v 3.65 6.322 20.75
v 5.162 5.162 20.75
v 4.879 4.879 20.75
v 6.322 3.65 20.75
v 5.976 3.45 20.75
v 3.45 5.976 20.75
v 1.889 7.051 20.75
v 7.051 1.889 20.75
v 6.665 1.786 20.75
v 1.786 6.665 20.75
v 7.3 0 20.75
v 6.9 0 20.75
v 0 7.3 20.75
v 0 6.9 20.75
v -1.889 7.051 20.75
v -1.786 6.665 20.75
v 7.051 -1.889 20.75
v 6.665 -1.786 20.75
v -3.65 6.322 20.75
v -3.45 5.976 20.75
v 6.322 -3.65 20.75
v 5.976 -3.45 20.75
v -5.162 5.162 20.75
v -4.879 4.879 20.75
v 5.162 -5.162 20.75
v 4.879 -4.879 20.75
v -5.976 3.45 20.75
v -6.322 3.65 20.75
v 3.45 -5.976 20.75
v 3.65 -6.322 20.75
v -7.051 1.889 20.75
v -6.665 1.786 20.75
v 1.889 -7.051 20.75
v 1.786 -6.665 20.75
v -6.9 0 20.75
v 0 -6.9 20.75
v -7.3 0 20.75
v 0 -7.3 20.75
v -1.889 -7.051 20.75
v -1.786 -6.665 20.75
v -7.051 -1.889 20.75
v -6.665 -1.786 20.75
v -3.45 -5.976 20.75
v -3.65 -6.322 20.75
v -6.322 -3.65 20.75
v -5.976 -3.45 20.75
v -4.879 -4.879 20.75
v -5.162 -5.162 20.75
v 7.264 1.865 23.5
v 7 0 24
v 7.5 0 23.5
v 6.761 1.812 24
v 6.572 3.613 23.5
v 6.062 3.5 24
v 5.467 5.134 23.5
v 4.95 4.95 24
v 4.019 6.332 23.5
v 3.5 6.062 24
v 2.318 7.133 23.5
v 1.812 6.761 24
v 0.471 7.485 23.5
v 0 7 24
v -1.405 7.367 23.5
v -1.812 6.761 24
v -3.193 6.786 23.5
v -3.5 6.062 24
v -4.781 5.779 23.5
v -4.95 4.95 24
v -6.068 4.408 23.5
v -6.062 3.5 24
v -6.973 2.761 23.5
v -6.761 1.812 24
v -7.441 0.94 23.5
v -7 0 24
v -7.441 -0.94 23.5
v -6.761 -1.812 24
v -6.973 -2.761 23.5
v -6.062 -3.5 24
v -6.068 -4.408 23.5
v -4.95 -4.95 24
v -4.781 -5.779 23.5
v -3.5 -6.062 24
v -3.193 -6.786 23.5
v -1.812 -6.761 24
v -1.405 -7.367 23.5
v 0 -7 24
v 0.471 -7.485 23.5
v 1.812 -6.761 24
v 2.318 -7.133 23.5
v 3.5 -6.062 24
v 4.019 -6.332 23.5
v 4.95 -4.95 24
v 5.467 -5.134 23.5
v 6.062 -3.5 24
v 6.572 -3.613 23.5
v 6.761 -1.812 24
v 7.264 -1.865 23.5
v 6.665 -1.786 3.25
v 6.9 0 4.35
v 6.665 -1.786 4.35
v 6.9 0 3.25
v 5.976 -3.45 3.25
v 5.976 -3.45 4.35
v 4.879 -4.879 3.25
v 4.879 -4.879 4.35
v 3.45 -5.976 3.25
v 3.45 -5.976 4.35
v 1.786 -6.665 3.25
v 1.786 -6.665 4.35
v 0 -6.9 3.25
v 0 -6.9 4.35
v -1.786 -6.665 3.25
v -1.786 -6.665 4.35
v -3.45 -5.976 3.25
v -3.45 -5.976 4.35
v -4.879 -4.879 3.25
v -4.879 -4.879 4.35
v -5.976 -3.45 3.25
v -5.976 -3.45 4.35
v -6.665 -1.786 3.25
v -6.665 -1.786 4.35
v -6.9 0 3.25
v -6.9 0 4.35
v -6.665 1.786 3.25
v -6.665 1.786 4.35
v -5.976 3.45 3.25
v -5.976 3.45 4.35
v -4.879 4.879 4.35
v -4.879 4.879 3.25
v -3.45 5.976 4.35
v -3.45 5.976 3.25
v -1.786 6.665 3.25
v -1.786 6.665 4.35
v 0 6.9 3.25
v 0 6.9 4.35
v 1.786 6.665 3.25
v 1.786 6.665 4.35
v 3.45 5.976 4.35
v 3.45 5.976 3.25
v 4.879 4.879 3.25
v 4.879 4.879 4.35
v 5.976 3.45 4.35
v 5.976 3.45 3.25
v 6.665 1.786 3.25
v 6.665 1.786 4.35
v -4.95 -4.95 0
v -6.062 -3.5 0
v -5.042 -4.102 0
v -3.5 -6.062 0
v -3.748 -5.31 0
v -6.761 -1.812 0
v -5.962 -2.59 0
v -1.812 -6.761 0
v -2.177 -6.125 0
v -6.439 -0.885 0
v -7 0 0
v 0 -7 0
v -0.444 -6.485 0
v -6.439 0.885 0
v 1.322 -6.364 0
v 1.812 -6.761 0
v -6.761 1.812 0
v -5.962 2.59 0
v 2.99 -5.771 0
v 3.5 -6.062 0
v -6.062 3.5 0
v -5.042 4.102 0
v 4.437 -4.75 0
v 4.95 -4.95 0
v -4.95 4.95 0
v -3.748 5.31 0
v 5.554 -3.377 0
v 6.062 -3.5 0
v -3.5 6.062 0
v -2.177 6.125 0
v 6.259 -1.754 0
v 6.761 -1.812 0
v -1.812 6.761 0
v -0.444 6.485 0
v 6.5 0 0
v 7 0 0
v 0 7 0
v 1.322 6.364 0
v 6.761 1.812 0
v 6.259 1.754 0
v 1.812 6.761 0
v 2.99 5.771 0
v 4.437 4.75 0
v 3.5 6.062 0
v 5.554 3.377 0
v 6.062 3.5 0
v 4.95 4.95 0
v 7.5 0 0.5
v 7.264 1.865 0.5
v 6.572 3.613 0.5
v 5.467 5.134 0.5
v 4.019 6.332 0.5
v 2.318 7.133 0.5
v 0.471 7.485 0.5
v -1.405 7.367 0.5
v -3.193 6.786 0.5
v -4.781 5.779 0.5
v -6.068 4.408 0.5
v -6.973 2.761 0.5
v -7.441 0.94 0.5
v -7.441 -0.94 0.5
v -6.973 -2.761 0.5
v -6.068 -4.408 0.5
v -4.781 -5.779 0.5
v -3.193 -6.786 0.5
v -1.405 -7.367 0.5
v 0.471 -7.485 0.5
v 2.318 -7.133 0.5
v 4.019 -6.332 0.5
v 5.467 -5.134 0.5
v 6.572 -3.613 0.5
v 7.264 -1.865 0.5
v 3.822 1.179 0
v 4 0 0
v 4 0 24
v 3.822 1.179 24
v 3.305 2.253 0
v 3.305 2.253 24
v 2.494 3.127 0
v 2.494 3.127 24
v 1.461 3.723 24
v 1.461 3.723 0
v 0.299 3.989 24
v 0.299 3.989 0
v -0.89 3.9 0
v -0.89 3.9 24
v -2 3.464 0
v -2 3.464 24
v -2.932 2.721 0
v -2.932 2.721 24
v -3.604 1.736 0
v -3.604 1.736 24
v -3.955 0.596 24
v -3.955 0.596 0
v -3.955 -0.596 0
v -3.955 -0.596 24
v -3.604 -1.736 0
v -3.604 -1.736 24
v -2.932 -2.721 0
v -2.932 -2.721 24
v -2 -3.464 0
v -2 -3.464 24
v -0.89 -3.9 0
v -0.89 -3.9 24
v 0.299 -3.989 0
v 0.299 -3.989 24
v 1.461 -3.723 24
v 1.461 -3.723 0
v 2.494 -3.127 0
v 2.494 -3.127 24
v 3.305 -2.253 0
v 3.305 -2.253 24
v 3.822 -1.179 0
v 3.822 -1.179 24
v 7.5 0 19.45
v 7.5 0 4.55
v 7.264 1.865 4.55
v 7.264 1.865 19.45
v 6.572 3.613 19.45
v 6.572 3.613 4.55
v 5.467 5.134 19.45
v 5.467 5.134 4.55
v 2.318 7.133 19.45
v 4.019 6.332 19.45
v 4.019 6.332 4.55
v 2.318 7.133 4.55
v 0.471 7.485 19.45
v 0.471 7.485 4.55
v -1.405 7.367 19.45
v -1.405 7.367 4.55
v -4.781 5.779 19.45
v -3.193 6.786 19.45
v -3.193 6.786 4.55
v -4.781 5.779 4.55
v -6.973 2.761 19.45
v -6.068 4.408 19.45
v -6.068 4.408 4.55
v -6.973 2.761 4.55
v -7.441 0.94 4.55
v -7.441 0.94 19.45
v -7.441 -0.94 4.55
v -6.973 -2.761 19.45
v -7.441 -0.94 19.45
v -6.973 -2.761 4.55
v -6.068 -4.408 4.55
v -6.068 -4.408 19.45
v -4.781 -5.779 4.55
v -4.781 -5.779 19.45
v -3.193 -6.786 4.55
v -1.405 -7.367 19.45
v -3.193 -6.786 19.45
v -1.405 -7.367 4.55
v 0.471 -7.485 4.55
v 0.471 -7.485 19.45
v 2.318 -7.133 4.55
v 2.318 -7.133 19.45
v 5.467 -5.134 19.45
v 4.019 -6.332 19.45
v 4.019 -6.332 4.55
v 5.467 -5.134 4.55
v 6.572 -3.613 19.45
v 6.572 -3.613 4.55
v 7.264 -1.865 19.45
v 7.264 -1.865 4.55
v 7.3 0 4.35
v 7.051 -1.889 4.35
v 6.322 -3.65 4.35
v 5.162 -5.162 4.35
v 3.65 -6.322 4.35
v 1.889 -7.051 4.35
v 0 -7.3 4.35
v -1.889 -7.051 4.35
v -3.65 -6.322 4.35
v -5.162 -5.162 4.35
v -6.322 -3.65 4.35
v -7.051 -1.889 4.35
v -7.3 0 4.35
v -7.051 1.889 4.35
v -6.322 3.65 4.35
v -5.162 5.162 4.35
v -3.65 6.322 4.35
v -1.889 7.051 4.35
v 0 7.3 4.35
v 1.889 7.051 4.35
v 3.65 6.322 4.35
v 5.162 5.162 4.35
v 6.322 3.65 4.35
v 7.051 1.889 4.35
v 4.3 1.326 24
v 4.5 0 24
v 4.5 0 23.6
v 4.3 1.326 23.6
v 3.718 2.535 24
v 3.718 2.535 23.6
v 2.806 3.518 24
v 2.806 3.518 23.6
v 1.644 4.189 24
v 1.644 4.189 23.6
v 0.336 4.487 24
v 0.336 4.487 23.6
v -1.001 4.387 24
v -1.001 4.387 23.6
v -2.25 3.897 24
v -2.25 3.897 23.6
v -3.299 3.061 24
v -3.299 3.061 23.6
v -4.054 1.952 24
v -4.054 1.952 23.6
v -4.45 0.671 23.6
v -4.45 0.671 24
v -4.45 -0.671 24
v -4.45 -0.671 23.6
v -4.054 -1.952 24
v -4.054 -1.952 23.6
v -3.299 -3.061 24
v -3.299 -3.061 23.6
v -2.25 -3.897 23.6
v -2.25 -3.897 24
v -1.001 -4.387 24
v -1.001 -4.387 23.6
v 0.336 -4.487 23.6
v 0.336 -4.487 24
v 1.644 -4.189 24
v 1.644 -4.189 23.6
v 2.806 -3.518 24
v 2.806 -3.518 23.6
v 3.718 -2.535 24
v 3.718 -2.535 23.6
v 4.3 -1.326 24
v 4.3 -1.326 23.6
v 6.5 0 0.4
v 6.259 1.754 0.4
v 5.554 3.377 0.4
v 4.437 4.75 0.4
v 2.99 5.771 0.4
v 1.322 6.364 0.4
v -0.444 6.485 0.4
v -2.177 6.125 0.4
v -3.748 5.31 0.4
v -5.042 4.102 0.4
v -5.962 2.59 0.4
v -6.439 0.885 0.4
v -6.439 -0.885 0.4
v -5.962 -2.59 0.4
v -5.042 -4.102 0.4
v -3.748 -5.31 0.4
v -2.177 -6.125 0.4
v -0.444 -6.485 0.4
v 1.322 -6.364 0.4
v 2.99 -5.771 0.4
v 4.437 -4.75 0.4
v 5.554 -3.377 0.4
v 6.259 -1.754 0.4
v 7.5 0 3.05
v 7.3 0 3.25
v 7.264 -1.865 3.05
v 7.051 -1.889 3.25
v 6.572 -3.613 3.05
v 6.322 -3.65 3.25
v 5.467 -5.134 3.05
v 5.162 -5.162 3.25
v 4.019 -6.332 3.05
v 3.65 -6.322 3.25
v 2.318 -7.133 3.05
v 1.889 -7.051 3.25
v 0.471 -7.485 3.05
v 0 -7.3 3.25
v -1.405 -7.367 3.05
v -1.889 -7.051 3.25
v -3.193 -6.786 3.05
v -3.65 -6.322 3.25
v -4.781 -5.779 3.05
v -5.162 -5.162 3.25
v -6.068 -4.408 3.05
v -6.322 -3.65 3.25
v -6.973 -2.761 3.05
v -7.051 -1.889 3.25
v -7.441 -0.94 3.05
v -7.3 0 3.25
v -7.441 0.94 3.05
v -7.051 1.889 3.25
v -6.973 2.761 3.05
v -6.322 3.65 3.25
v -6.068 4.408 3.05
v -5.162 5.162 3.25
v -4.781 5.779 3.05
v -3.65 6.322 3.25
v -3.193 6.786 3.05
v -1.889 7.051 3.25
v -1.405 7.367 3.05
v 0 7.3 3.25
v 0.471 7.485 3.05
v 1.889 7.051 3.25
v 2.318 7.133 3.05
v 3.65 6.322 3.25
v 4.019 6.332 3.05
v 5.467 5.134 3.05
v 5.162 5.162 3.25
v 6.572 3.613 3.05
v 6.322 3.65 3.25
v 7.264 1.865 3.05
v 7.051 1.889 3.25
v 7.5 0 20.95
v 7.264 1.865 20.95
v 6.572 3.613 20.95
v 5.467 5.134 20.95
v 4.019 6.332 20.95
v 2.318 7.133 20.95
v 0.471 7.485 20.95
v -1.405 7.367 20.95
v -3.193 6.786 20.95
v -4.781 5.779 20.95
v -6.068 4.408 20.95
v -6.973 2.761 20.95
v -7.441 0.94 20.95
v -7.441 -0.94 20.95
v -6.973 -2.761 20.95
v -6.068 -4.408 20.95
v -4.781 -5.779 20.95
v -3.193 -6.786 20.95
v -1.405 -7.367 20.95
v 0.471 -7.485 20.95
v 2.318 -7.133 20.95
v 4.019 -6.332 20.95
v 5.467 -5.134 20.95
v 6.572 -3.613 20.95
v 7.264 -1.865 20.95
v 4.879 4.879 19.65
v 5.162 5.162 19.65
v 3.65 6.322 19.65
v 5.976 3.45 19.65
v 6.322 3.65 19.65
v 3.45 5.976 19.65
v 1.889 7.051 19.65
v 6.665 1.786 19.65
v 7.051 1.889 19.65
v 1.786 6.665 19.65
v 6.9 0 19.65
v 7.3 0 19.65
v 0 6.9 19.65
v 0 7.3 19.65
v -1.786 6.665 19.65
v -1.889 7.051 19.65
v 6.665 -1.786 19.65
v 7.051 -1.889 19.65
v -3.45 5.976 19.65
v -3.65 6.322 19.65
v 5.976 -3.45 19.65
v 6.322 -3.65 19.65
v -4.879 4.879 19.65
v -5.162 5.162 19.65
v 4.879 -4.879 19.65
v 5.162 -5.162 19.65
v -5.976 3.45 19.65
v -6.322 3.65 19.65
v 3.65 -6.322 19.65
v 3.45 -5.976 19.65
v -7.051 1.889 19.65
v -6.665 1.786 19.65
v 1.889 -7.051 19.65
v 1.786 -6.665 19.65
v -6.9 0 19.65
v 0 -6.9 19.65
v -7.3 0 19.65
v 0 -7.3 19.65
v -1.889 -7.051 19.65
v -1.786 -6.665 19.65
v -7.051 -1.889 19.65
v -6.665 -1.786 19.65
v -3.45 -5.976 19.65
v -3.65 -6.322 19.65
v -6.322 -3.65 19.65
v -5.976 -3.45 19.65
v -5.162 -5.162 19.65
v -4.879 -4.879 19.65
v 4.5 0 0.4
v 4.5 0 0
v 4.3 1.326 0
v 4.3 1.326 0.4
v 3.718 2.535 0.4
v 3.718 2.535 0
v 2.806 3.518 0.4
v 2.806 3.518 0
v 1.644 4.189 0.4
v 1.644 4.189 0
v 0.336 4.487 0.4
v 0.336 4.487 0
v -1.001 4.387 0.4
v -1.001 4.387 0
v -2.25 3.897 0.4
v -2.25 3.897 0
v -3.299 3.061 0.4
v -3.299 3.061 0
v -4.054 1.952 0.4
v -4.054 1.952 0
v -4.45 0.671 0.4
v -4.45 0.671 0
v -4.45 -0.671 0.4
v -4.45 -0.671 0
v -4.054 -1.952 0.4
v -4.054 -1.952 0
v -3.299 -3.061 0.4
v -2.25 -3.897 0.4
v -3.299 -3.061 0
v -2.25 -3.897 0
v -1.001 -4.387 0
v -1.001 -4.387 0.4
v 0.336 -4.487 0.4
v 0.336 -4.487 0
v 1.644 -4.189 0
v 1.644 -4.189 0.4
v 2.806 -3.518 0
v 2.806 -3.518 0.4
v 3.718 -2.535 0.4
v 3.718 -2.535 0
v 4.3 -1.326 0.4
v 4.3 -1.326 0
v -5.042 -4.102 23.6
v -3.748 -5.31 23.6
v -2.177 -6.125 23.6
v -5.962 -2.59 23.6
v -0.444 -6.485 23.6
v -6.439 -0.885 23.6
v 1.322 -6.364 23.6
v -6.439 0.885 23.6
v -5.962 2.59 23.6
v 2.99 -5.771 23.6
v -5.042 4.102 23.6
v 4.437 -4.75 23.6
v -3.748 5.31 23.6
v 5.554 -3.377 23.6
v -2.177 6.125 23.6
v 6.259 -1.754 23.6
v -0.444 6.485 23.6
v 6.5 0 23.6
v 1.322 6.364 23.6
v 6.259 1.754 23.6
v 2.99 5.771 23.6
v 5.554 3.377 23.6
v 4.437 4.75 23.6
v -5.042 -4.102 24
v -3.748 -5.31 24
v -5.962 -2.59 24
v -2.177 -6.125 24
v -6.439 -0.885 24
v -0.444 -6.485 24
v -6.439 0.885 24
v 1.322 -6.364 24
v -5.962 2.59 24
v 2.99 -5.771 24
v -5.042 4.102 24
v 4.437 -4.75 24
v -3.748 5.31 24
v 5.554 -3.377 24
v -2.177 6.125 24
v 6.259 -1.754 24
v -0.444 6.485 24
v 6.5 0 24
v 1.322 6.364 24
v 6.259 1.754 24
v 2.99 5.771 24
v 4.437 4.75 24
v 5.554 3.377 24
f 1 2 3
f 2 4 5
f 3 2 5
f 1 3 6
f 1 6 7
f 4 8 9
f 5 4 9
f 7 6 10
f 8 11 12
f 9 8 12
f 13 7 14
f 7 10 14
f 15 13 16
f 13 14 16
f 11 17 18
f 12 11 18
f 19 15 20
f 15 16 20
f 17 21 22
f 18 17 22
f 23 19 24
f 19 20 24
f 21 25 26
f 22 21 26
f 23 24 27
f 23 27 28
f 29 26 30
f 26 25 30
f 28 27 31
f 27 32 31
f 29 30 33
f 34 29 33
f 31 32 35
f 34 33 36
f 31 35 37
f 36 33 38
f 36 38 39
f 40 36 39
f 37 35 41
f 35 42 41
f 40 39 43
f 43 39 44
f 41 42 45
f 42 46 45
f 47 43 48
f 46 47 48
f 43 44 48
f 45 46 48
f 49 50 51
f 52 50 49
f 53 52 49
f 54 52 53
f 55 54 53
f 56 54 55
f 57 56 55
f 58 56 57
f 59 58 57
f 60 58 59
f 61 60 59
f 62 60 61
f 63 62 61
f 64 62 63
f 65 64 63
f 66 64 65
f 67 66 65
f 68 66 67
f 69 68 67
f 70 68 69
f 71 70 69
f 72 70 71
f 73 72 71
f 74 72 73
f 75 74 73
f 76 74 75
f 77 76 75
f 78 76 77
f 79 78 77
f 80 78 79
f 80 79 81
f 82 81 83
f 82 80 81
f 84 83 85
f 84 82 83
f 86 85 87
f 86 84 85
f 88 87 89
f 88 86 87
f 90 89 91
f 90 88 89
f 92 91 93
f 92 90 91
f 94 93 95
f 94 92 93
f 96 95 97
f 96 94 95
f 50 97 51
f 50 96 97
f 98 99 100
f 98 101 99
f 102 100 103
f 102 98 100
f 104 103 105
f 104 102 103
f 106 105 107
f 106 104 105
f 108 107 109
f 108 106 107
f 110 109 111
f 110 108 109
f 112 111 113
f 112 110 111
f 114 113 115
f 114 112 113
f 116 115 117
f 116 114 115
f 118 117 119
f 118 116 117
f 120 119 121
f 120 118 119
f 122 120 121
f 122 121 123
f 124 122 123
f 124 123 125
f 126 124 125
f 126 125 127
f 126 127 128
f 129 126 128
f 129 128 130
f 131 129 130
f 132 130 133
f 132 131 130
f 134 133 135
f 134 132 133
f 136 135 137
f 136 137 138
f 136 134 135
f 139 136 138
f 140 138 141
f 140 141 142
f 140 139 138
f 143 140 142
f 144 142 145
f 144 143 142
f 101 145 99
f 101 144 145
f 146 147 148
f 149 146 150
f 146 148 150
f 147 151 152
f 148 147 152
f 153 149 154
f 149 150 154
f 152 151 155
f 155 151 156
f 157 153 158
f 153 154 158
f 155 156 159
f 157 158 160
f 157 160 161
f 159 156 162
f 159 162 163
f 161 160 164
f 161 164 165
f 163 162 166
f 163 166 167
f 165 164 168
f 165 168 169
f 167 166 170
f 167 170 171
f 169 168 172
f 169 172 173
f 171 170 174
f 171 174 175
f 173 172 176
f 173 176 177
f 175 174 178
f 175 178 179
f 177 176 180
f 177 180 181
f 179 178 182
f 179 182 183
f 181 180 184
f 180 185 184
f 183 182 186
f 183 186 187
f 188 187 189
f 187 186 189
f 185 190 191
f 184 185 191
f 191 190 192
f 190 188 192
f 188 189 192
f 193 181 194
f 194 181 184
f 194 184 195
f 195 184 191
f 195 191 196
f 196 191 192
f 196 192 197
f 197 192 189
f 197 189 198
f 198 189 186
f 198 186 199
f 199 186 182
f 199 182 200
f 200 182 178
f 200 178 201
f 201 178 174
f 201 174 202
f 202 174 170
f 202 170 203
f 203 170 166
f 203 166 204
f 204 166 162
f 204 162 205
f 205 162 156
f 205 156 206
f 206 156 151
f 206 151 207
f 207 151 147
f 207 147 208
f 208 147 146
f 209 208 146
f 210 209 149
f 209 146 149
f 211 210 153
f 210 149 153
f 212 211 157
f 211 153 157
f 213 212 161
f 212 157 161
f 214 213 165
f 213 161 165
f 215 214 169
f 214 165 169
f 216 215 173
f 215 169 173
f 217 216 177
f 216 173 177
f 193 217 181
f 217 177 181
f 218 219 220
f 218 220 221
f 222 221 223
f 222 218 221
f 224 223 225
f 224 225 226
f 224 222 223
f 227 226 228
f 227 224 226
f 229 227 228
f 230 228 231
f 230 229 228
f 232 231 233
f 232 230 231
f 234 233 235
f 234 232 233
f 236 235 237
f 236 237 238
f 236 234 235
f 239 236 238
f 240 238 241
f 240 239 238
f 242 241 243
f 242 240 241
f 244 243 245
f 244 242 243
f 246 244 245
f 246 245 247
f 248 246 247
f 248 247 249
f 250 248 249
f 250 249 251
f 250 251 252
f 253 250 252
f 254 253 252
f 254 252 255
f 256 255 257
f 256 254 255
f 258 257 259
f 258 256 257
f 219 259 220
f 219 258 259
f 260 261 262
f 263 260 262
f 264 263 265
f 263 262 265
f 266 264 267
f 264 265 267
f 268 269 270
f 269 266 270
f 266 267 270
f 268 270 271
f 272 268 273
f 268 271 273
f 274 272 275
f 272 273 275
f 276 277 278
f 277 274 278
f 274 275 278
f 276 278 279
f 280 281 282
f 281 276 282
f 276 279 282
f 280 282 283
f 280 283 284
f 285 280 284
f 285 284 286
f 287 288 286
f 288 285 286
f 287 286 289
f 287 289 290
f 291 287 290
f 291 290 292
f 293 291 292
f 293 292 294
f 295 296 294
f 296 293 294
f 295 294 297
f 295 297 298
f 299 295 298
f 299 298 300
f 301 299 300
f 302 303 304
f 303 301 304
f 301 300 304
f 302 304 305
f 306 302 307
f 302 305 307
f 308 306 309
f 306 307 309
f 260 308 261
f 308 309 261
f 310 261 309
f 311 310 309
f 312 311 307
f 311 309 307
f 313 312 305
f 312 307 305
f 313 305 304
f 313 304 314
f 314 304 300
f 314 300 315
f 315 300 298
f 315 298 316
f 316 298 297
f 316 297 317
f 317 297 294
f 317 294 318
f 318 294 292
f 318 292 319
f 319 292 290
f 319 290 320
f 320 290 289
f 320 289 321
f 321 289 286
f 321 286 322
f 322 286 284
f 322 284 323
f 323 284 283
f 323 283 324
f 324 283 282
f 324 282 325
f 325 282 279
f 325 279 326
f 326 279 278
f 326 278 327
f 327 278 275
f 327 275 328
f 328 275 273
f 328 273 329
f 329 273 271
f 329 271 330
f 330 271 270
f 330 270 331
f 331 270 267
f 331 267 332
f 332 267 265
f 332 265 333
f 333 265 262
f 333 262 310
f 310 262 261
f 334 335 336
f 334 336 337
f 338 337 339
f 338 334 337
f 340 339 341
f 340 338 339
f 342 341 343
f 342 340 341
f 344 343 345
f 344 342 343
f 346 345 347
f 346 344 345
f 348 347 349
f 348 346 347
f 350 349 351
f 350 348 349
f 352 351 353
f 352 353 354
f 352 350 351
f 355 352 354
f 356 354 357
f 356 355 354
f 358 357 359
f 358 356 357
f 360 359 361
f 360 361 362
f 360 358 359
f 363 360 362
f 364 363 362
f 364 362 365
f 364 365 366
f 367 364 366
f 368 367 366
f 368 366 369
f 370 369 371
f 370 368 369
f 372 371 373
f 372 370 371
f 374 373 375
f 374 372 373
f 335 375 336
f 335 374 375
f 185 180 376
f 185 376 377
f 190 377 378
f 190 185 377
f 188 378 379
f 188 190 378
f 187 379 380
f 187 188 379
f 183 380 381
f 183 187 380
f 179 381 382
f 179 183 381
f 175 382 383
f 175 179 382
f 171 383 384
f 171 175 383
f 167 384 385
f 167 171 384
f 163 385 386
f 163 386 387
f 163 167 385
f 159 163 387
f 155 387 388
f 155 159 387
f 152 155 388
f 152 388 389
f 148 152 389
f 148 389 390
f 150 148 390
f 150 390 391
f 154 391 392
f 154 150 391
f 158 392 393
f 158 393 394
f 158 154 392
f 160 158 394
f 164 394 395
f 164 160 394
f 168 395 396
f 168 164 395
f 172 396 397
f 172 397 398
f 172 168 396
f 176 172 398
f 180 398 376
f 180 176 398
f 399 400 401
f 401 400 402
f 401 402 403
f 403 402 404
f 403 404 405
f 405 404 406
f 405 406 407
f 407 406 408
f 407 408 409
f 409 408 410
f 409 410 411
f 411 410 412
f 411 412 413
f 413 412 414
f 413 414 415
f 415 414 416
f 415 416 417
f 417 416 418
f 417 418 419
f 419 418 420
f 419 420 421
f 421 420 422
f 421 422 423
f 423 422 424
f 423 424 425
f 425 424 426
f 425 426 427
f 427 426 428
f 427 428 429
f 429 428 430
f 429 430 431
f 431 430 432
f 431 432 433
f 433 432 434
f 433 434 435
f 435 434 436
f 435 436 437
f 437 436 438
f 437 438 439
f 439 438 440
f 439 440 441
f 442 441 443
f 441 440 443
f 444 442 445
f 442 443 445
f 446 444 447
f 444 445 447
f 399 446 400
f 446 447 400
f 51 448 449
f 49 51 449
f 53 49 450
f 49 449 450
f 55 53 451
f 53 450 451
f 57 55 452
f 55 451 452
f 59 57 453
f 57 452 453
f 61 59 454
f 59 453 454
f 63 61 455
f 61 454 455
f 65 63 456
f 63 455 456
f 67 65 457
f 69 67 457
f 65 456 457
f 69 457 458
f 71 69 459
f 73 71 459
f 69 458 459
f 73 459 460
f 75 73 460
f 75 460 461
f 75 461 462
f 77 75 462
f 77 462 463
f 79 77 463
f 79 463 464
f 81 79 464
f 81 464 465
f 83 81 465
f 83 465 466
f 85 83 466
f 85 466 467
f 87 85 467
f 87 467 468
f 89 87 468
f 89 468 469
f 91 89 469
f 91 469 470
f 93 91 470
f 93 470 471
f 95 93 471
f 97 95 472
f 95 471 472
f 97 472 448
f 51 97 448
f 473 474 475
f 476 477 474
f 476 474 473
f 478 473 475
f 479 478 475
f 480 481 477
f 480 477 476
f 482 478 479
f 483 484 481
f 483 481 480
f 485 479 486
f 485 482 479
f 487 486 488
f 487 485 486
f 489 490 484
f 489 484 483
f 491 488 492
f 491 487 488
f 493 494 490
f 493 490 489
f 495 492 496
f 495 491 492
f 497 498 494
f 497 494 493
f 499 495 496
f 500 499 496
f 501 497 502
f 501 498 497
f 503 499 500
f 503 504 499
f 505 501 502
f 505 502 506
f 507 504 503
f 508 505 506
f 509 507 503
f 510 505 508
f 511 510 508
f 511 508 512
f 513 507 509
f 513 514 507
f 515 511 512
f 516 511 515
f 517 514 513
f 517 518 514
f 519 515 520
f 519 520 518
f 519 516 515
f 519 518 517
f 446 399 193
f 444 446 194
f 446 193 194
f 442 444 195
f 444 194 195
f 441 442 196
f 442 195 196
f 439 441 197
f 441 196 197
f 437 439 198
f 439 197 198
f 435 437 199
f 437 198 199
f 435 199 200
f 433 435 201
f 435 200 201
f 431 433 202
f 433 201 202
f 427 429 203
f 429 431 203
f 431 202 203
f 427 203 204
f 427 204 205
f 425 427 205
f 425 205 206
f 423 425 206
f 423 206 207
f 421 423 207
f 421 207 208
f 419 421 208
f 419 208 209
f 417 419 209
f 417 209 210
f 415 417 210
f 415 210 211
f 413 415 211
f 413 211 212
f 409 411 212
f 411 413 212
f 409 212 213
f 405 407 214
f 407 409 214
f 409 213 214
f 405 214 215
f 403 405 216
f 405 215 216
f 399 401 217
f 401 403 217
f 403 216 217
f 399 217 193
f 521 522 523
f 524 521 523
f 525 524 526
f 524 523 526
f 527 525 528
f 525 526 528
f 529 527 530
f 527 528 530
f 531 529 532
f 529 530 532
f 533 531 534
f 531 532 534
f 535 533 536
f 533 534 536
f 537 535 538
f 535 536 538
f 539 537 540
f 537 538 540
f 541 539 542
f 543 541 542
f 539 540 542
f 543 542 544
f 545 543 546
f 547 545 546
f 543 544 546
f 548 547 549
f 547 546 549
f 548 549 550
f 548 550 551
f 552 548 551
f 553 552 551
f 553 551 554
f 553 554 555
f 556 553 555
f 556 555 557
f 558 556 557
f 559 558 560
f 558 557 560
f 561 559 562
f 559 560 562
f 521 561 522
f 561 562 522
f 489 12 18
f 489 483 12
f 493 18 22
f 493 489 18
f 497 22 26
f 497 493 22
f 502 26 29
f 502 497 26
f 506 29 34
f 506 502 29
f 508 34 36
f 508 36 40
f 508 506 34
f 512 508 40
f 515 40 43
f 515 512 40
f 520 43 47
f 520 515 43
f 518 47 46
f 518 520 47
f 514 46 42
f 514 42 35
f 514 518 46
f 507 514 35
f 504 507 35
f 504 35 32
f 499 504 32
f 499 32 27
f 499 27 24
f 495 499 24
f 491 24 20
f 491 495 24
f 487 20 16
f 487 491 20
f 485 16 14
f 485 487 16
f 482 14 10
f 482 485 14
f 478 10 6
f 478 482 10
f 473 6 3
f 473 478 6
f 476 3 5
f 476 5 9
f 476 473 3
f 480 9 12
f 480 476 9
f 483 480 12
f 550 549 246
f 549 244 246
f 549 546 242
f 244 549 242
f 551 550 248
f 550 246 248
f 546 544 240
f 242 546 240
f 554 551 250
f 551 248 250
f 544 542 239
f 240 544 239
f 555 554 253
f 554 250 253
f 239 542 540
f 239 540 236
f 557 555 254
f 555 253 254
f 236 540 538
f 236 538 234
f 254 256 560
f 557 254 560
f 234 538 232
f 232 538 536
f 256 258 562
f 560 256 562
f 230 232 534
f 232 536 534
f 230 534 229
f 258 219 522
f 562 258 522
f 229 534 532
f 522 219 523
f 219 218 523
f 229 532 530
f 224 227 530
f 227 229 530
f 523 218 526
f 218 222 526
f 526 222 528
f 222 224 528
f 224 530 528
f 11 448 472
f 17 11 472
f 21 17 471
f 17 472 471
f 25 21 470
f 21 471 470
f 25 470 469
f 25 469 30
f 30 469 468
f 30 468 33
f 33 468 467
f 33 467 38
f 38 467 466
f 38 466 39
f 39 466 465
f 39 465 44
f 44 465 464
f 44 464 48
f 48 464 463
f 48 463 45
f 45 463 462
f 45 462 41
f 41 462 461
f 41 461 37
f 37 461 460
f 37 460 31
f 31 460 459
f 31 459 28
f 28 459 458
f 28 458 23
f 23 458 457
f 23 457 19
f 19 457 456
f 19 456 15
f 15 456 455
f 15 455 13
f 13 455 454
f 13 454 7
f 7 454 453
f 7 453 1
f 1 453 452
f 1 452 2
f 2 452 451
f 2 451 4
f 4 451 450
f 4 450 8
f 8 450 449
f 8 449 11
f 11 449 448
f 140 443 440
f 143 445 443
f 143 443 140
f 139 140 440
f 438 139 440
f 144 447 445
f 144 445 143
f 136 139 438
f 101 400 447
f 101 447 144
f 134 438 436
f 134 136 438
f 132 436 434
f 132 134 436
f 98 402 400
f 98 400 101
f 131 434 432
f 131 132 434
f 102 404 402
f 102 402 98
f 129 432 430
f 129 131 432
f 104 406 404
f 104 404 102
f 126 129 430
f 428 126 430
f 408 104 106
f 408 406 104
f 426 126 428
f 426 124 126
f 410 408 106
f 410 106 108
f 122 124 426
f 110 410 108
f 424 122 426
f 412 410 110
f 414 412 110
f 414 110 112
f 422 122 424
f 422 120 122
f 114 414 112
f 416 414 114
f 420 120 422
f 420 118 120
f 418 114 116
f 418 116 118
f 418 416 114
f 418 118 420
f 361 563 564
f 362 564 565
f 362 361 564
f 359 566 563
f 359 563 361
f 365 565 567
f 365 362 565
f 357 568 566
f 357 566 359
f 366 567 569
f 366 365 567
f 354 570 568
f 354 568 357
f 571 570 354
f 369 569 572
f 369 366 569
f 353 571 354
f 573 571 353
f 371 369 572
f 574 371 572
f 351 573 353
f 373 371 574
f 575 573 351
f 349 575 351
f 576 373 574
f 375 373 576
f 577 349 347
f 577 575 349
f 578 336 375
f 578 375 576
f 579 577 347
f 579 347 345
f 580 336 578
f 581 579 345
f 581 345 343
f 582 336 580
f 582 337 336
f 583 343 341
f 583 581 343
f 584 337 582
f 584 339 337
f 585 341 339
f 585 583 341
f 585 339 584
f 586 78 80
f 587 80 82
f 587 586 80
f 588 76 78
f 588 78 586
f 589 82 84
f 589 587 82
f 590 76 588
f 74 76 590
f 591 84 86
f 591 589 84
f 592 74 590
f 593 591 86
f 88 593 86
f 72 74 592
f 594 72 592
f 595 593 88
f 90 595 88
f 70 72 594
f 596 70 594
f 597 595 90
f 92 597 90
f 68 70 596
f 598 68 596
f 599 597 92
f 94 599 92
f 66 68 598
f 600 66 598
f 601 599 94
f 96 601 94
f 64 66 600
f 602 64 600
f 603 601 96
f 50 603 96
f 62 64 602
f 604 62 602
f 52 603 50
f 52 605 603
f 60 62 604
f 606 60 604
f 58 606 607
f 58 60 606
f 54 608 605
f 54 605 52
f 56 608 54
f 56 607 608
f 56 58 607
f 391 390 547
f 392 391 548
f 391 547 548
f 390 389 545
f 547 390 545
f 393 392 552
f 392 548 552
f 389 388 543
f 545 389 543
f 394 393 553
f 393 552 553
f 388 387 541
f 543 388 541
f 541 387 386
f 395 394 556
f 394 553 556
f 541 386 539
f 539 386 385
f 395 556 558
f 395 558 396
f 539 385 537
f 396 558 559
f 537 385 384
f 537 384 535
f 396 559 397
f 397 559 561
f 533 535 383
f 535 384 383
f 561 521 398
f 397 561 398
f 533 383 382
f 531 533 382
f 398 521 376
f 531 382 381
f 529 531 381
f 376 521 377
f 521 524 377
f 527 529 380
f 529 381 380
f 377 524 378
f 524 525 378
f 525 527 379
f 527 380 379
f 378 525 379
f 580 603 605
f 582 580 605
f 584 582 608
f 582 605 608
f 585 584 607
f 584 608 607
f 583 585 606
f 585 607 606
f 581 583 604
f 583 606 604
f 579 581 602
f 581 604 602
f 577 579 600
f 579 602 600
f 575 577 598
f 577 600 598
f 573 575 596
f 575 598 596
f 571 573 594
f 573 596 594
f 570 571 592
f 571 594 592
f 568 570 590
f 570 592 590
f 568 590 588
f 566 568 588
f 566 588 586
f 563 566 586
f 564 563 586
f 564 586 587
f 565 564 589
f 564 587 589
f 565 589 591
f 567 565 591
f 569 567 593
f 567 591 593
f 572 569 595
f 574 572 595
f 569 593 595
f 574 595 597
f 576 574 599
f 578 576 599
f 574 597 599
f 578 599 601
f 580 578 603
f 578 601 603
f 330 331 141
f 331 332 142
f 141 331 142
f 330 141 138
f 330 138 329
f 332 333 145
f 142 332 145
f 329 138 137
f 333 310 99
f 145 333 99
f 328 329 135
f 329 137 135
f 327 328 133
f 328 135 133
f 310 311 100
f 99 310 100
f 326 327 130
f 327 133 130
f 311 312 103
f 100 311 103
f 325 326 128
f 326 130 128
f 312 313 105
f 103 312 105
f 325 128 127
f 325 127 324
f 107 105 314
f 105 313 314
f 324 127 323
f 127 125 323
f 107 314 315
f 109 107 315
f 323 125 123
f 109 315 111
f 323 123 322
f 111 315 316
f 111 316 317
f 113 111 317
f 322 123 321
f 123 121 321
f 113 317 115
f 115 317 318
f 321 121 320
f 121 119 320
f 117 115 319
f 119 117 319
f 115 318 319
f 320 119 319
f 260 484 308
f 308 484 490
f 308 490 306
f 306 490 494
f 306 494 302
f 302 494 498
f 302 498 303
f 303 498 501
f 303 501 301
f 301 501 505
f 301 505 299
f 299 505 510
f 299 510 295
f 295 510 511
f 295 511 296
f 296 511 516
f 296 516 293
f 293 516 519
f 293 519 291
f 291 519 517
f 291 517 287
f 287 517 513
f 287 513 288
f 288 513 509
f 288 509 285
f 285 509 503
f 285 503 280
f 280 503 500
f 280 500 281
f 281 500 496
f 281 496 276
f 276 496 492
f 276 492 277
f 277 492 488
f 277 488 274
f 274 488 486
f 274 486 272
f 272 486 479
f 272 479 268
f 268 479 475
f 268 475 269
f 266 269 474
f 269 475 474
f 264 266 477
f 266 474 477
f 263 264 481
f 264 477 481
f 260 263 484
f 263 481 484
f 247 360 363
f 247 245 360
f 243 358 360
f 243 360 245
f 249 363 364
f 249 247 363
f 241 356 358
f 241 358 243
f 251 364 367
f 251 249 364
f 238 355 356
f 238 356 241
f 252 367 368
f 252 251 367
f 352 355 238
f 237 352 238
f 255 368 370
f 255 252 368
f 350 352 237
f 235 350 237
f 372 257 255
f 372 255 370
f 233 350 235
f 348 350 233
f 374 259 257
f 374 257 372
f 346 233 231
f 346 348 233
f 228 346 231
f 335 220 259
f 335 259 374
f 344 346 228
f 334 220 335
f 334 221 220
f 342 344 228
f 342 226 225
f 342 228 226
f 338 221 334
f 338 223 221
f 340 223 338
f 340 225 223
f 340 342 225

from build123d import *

# Parameters (mm, degrees)
SKETCH1_R           = 7.5
SKETCH1_R_2         = 4
BOSS_EXTRUDE1_DEPTH = 24
SKETCH2_R           = 6.5
SKETCH2_R_2         = 4.5
CUT_EXTRUDE1_DEPTH  = 0.4
SKETCH3_W           = 1.1
SKETCH3_H           = 0.6
CHAMFER1_SIZE       = 0.5
CHAMFER2_SIZE       = 0.2


with BuildPart() as part:
    # Sketch1 → Boss-Extrude1 (new body)
    with BuildSketch(Plane.XY):
        Circle(SKETCH1_R)
        Circle(SKETCH1_R_2, mode=Mode.SUBTRACT)
    extrude(amount=BOSS_EXTRUDE1_DEPTH)

    # Sketch2 → Cut-Extrude1 (cut)
    with BuildSketch(Plane.XY.offset(24)):
        Circle(SKETCH2_R)
        Circle(SKETCH2_R_2, mode=Mode.SUBTRACT)
    cut_extrude1 = extrude(amount=-CUT_EXTRUDE1_DEPTH, mode=Mode.SUBTRACT)

    # Mirror1: Cut-Extrude1 across plane
    add(cut_extrude1.mirror(Plane.XY.offset(12)), mode=Mode.SUBTRACT)

    # Sketch3 → Cut-Revolve1 (revolve, cut)
    with BuildSketch(Plane(origin=(0, 0, 0), x_dir=(0, 0, -1), z_dir=(1, 0, 0)), mode=Mode.PRIVATE) as cut_revolve1_sk:
        with Locations((-20.2, 7.2)):
            Rectangle(SKETCH3_W, SKETCH3_H)
        with Locations((-3.8, 7.2)):
            Rectangle(SKETCH3_W, SKETCH3_H)
    revolve(cut_revolve1_sk.sketch.rotate(Axis((0, 0, 24), (0, 0, -1)), 90), axis=Axis((0, 0, 24), (0, 0, -1)), mode=Mode.SUBTRACT)

    # Chamfer1
    chamfer1_edges = [part.edges().sort_by_distance(p)[0] for p in [
        (-7.5, 0, 0),
        (-7.5, 0, 24),
    ]]
    chamfer(chamfer1_edges, length=CHAMFER1_SIZE)

    # Chamfer2
    chamfer2_edges = [part.edges().sort_by_distance(p)[0] for p in [
        (-7.5, 0, 20.75),
        (-7.5, 0, 19.65),
        (-7.5, 0, 4.35),
        (-7.5, 0, 3.25),
    ]]
    chamfer(chamfer2_edges, length=CHAMFER2_SIZE)


solid = part.part
